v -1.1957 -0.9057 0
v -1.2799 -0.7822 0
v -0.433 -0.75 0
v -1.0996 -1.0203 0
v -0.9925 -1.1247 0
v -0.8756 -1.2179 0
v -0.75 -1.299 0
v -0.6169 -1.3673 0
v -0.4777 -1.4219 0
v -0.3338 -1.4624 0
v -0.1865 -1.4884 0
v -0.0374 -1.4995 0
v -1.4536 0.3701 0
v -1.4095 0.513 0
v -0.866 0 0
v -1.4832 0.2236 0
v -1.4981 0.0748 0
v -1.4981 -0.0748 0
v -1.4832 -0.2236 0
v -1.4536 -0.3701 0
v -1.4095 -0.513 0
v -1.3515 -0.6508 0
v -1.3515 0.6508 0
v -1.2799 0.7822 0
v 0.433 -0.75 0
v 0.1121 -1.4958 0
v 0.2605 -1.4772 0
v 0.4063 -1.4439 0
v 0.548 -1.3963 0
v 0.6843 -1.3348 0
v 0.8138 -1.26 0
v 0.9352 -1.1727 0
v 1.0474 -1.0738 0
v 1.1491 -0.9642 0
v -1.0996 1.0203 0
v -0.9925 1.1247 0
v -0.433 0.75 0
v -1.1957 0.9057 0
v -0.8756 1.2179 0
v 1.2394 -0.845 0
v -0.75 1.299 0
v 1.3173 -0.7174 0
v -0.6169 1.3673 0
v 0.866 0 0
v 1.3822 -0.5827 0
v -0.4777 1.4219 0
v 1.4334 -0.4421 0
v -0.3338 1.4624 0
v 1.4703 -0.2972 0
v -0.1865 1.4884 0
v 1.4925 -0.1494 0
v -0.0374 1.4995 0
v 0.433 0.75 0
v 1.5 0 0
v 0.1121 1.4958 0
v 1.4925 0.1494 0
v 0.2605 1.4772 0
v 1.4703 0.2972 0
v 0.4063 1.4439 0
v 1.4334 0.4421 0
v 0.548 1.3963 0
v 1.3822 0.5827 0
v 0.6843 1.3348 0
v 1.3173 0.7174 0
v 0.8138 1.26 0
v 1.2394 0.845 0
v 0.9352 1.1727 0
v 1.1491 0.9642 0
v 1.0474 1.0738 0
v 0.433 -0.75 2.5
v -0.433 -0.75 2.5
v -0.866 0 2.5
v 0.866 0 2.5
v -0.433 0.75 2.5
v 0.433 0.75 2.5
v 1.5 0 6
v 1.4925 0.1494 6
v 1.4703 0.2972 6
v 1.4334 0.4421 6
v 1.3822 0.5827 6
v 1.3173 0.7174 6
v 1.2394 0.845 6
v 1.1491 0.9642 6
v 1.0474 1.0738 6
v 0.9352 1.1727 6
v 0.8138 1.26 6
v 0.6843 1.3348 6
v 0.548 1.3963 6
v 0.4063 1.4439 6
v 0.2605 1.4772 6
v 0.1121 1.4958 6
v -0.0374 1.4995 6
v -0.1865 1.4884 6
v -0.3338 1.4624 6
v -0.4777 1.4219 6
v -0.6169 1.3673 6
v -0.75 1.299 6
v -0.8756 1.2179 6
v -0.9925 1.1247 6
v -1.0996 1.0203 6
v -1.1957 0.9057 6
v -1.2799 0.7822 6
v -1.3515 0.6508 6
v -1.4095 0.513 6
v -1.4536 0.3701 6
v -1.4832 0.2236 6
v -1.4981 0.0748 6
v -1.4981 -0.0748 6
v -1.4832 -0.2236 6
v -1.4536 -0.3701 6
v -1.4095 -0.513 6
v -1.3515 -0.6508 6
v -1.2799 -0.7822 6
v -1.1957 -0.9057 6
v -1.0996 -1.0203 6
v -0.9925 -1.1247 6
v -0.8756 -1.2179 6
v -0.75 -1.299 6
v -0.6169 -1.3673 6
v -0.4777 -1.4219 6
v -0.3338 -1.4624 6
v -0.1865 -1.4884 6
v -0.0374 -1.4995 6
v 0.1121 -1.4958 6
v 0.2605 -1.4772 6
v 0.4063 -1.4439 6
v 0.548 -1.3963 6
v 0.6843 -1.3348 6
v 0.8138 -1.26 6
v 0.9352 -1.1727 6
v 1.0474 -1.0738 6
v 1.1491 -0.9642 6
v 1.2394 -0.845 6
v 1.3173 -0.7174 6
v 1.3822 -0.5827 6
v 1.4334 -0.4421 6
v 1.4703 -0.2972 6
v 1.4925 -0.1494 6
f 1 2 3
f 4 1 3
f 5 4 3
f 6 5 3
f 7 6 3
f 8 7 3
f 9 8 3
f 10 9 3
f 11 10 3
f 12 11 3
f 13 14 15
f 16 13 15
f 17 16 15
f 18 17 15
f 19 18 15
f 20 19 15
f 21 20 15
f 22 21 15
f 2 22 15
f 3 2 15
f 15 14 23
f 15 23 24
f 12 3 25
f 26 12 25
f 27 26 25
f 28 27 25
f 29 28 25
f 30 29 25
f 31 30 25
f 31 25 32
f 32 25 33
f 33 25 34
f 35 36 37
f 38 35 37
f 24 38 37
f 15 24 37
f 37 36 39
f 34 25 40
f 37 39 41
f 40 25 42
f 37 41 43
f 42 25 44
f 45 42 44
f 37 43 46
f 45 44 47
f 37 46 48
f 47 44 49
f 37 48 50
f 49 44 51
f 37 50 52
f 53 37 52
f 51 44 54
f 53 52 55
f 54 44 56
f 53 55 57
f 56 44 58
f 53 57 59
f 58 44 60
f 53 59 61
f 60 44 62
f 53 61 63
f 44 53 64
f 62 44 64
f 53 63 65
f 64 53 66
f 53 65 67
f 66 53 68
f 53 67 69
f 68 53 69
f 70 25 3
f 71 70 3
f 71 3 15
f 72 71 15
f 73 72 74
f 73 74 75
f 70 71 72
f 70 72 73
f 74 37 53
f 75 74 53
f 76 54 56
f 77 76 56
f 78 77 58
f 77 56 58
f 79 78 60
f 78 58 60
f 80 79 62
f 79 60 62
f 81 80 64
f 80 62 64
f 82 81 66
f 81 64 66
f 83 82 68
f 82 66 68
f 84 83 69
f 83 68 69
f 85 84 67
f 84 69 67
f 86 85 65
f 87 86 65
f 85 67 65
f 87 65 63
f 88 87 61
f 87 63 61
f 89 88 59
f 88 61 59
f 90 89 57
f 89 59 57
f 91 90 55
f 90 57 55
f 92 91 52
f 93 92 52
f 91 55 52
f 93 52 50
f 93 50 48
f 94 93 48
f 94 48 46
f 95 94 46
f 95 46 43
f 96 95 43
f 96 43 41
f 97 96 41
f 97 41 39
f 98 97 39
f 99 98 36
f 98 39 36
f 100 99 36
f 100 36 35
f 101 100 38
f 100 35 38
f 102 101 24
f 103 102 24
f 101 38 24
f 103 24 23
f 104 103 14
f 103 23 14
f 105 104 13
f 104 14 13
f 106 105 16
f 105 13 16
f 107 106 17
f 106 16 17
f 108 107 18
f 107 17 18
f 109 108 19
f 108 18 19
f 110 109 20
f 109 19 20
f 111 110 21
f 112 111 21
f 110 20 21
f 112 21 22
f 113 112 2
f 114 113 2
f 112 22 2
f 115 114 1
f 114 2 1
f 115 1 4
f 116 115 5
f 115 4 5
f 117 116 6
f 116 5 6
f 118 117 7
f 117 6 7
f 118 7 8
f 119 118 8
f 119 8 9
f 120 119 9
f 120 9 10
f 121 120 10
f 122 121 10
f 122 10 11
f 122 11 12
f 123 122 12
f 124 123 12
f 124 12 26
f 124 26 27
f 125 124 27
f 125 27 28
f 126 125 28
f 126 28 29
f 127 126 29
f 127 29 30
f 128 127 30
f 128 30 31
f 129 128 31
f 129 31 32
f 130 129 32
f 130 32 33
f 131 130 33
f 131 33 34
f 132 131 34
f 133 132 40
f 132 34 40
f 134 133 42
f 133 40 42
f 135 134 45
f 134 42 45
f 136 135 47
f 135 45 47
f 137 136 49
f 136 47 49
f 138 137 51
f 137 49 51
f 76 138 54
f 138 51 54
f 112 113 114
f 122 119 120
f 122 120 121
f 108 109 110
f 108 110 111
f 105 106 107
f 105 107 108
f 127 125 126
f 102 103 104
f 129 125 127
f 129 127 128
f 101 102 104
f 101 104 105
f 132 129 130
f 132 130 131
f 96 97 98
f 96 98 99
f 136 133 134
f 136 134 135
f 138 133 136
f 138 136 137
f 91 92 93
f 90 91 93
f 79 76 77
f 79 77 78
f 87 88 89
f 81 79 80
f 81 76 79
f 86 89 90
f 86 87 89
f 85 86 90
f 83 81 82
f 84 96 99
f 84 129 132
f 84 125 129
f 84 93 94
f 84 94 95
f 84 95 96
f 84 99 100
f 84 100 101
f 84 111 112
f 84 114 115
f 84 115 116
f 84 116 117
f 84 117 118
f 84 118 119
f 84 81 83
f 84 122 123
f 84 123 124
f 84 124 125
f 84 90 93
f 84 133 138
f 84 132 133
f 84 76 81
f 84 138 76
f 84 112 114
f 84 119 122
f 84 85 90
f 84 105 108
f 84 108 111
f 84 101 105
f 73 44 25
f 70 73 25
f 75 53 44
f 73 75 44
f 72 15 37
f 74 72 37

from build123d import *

# Parameters (mm, degrees)
SKETCH_R     = 1.5
PAD_DEPTH    = 6
POCKET_DEPTH = 2.5


with BuildPart() as part:
    # Sketch → Pad (new body)
    with BuildSketch(Plane.XY):
        Circle(SKETCH_R)
    extrude(amount=PAD_DEPTH)

    # Sketch001 (on Face2 of Pad) → Pocket (cut)
    with BuildSketch(Plane(origin=(0, 0, 0), x_dir=(1, 0, 0), z_dir=(0, 0, -1))):
        Polygon((0.866025, 0), (0.433013, 0.75), (-0.433013, 0.75), (-0.866025, 0), (-0.433013, -0.75), (0.433013, -0.75), align=None)
    extrude(amount=-POCKET_DEPTH, mode=Mode.SUBTRACT)


solid = part.part
